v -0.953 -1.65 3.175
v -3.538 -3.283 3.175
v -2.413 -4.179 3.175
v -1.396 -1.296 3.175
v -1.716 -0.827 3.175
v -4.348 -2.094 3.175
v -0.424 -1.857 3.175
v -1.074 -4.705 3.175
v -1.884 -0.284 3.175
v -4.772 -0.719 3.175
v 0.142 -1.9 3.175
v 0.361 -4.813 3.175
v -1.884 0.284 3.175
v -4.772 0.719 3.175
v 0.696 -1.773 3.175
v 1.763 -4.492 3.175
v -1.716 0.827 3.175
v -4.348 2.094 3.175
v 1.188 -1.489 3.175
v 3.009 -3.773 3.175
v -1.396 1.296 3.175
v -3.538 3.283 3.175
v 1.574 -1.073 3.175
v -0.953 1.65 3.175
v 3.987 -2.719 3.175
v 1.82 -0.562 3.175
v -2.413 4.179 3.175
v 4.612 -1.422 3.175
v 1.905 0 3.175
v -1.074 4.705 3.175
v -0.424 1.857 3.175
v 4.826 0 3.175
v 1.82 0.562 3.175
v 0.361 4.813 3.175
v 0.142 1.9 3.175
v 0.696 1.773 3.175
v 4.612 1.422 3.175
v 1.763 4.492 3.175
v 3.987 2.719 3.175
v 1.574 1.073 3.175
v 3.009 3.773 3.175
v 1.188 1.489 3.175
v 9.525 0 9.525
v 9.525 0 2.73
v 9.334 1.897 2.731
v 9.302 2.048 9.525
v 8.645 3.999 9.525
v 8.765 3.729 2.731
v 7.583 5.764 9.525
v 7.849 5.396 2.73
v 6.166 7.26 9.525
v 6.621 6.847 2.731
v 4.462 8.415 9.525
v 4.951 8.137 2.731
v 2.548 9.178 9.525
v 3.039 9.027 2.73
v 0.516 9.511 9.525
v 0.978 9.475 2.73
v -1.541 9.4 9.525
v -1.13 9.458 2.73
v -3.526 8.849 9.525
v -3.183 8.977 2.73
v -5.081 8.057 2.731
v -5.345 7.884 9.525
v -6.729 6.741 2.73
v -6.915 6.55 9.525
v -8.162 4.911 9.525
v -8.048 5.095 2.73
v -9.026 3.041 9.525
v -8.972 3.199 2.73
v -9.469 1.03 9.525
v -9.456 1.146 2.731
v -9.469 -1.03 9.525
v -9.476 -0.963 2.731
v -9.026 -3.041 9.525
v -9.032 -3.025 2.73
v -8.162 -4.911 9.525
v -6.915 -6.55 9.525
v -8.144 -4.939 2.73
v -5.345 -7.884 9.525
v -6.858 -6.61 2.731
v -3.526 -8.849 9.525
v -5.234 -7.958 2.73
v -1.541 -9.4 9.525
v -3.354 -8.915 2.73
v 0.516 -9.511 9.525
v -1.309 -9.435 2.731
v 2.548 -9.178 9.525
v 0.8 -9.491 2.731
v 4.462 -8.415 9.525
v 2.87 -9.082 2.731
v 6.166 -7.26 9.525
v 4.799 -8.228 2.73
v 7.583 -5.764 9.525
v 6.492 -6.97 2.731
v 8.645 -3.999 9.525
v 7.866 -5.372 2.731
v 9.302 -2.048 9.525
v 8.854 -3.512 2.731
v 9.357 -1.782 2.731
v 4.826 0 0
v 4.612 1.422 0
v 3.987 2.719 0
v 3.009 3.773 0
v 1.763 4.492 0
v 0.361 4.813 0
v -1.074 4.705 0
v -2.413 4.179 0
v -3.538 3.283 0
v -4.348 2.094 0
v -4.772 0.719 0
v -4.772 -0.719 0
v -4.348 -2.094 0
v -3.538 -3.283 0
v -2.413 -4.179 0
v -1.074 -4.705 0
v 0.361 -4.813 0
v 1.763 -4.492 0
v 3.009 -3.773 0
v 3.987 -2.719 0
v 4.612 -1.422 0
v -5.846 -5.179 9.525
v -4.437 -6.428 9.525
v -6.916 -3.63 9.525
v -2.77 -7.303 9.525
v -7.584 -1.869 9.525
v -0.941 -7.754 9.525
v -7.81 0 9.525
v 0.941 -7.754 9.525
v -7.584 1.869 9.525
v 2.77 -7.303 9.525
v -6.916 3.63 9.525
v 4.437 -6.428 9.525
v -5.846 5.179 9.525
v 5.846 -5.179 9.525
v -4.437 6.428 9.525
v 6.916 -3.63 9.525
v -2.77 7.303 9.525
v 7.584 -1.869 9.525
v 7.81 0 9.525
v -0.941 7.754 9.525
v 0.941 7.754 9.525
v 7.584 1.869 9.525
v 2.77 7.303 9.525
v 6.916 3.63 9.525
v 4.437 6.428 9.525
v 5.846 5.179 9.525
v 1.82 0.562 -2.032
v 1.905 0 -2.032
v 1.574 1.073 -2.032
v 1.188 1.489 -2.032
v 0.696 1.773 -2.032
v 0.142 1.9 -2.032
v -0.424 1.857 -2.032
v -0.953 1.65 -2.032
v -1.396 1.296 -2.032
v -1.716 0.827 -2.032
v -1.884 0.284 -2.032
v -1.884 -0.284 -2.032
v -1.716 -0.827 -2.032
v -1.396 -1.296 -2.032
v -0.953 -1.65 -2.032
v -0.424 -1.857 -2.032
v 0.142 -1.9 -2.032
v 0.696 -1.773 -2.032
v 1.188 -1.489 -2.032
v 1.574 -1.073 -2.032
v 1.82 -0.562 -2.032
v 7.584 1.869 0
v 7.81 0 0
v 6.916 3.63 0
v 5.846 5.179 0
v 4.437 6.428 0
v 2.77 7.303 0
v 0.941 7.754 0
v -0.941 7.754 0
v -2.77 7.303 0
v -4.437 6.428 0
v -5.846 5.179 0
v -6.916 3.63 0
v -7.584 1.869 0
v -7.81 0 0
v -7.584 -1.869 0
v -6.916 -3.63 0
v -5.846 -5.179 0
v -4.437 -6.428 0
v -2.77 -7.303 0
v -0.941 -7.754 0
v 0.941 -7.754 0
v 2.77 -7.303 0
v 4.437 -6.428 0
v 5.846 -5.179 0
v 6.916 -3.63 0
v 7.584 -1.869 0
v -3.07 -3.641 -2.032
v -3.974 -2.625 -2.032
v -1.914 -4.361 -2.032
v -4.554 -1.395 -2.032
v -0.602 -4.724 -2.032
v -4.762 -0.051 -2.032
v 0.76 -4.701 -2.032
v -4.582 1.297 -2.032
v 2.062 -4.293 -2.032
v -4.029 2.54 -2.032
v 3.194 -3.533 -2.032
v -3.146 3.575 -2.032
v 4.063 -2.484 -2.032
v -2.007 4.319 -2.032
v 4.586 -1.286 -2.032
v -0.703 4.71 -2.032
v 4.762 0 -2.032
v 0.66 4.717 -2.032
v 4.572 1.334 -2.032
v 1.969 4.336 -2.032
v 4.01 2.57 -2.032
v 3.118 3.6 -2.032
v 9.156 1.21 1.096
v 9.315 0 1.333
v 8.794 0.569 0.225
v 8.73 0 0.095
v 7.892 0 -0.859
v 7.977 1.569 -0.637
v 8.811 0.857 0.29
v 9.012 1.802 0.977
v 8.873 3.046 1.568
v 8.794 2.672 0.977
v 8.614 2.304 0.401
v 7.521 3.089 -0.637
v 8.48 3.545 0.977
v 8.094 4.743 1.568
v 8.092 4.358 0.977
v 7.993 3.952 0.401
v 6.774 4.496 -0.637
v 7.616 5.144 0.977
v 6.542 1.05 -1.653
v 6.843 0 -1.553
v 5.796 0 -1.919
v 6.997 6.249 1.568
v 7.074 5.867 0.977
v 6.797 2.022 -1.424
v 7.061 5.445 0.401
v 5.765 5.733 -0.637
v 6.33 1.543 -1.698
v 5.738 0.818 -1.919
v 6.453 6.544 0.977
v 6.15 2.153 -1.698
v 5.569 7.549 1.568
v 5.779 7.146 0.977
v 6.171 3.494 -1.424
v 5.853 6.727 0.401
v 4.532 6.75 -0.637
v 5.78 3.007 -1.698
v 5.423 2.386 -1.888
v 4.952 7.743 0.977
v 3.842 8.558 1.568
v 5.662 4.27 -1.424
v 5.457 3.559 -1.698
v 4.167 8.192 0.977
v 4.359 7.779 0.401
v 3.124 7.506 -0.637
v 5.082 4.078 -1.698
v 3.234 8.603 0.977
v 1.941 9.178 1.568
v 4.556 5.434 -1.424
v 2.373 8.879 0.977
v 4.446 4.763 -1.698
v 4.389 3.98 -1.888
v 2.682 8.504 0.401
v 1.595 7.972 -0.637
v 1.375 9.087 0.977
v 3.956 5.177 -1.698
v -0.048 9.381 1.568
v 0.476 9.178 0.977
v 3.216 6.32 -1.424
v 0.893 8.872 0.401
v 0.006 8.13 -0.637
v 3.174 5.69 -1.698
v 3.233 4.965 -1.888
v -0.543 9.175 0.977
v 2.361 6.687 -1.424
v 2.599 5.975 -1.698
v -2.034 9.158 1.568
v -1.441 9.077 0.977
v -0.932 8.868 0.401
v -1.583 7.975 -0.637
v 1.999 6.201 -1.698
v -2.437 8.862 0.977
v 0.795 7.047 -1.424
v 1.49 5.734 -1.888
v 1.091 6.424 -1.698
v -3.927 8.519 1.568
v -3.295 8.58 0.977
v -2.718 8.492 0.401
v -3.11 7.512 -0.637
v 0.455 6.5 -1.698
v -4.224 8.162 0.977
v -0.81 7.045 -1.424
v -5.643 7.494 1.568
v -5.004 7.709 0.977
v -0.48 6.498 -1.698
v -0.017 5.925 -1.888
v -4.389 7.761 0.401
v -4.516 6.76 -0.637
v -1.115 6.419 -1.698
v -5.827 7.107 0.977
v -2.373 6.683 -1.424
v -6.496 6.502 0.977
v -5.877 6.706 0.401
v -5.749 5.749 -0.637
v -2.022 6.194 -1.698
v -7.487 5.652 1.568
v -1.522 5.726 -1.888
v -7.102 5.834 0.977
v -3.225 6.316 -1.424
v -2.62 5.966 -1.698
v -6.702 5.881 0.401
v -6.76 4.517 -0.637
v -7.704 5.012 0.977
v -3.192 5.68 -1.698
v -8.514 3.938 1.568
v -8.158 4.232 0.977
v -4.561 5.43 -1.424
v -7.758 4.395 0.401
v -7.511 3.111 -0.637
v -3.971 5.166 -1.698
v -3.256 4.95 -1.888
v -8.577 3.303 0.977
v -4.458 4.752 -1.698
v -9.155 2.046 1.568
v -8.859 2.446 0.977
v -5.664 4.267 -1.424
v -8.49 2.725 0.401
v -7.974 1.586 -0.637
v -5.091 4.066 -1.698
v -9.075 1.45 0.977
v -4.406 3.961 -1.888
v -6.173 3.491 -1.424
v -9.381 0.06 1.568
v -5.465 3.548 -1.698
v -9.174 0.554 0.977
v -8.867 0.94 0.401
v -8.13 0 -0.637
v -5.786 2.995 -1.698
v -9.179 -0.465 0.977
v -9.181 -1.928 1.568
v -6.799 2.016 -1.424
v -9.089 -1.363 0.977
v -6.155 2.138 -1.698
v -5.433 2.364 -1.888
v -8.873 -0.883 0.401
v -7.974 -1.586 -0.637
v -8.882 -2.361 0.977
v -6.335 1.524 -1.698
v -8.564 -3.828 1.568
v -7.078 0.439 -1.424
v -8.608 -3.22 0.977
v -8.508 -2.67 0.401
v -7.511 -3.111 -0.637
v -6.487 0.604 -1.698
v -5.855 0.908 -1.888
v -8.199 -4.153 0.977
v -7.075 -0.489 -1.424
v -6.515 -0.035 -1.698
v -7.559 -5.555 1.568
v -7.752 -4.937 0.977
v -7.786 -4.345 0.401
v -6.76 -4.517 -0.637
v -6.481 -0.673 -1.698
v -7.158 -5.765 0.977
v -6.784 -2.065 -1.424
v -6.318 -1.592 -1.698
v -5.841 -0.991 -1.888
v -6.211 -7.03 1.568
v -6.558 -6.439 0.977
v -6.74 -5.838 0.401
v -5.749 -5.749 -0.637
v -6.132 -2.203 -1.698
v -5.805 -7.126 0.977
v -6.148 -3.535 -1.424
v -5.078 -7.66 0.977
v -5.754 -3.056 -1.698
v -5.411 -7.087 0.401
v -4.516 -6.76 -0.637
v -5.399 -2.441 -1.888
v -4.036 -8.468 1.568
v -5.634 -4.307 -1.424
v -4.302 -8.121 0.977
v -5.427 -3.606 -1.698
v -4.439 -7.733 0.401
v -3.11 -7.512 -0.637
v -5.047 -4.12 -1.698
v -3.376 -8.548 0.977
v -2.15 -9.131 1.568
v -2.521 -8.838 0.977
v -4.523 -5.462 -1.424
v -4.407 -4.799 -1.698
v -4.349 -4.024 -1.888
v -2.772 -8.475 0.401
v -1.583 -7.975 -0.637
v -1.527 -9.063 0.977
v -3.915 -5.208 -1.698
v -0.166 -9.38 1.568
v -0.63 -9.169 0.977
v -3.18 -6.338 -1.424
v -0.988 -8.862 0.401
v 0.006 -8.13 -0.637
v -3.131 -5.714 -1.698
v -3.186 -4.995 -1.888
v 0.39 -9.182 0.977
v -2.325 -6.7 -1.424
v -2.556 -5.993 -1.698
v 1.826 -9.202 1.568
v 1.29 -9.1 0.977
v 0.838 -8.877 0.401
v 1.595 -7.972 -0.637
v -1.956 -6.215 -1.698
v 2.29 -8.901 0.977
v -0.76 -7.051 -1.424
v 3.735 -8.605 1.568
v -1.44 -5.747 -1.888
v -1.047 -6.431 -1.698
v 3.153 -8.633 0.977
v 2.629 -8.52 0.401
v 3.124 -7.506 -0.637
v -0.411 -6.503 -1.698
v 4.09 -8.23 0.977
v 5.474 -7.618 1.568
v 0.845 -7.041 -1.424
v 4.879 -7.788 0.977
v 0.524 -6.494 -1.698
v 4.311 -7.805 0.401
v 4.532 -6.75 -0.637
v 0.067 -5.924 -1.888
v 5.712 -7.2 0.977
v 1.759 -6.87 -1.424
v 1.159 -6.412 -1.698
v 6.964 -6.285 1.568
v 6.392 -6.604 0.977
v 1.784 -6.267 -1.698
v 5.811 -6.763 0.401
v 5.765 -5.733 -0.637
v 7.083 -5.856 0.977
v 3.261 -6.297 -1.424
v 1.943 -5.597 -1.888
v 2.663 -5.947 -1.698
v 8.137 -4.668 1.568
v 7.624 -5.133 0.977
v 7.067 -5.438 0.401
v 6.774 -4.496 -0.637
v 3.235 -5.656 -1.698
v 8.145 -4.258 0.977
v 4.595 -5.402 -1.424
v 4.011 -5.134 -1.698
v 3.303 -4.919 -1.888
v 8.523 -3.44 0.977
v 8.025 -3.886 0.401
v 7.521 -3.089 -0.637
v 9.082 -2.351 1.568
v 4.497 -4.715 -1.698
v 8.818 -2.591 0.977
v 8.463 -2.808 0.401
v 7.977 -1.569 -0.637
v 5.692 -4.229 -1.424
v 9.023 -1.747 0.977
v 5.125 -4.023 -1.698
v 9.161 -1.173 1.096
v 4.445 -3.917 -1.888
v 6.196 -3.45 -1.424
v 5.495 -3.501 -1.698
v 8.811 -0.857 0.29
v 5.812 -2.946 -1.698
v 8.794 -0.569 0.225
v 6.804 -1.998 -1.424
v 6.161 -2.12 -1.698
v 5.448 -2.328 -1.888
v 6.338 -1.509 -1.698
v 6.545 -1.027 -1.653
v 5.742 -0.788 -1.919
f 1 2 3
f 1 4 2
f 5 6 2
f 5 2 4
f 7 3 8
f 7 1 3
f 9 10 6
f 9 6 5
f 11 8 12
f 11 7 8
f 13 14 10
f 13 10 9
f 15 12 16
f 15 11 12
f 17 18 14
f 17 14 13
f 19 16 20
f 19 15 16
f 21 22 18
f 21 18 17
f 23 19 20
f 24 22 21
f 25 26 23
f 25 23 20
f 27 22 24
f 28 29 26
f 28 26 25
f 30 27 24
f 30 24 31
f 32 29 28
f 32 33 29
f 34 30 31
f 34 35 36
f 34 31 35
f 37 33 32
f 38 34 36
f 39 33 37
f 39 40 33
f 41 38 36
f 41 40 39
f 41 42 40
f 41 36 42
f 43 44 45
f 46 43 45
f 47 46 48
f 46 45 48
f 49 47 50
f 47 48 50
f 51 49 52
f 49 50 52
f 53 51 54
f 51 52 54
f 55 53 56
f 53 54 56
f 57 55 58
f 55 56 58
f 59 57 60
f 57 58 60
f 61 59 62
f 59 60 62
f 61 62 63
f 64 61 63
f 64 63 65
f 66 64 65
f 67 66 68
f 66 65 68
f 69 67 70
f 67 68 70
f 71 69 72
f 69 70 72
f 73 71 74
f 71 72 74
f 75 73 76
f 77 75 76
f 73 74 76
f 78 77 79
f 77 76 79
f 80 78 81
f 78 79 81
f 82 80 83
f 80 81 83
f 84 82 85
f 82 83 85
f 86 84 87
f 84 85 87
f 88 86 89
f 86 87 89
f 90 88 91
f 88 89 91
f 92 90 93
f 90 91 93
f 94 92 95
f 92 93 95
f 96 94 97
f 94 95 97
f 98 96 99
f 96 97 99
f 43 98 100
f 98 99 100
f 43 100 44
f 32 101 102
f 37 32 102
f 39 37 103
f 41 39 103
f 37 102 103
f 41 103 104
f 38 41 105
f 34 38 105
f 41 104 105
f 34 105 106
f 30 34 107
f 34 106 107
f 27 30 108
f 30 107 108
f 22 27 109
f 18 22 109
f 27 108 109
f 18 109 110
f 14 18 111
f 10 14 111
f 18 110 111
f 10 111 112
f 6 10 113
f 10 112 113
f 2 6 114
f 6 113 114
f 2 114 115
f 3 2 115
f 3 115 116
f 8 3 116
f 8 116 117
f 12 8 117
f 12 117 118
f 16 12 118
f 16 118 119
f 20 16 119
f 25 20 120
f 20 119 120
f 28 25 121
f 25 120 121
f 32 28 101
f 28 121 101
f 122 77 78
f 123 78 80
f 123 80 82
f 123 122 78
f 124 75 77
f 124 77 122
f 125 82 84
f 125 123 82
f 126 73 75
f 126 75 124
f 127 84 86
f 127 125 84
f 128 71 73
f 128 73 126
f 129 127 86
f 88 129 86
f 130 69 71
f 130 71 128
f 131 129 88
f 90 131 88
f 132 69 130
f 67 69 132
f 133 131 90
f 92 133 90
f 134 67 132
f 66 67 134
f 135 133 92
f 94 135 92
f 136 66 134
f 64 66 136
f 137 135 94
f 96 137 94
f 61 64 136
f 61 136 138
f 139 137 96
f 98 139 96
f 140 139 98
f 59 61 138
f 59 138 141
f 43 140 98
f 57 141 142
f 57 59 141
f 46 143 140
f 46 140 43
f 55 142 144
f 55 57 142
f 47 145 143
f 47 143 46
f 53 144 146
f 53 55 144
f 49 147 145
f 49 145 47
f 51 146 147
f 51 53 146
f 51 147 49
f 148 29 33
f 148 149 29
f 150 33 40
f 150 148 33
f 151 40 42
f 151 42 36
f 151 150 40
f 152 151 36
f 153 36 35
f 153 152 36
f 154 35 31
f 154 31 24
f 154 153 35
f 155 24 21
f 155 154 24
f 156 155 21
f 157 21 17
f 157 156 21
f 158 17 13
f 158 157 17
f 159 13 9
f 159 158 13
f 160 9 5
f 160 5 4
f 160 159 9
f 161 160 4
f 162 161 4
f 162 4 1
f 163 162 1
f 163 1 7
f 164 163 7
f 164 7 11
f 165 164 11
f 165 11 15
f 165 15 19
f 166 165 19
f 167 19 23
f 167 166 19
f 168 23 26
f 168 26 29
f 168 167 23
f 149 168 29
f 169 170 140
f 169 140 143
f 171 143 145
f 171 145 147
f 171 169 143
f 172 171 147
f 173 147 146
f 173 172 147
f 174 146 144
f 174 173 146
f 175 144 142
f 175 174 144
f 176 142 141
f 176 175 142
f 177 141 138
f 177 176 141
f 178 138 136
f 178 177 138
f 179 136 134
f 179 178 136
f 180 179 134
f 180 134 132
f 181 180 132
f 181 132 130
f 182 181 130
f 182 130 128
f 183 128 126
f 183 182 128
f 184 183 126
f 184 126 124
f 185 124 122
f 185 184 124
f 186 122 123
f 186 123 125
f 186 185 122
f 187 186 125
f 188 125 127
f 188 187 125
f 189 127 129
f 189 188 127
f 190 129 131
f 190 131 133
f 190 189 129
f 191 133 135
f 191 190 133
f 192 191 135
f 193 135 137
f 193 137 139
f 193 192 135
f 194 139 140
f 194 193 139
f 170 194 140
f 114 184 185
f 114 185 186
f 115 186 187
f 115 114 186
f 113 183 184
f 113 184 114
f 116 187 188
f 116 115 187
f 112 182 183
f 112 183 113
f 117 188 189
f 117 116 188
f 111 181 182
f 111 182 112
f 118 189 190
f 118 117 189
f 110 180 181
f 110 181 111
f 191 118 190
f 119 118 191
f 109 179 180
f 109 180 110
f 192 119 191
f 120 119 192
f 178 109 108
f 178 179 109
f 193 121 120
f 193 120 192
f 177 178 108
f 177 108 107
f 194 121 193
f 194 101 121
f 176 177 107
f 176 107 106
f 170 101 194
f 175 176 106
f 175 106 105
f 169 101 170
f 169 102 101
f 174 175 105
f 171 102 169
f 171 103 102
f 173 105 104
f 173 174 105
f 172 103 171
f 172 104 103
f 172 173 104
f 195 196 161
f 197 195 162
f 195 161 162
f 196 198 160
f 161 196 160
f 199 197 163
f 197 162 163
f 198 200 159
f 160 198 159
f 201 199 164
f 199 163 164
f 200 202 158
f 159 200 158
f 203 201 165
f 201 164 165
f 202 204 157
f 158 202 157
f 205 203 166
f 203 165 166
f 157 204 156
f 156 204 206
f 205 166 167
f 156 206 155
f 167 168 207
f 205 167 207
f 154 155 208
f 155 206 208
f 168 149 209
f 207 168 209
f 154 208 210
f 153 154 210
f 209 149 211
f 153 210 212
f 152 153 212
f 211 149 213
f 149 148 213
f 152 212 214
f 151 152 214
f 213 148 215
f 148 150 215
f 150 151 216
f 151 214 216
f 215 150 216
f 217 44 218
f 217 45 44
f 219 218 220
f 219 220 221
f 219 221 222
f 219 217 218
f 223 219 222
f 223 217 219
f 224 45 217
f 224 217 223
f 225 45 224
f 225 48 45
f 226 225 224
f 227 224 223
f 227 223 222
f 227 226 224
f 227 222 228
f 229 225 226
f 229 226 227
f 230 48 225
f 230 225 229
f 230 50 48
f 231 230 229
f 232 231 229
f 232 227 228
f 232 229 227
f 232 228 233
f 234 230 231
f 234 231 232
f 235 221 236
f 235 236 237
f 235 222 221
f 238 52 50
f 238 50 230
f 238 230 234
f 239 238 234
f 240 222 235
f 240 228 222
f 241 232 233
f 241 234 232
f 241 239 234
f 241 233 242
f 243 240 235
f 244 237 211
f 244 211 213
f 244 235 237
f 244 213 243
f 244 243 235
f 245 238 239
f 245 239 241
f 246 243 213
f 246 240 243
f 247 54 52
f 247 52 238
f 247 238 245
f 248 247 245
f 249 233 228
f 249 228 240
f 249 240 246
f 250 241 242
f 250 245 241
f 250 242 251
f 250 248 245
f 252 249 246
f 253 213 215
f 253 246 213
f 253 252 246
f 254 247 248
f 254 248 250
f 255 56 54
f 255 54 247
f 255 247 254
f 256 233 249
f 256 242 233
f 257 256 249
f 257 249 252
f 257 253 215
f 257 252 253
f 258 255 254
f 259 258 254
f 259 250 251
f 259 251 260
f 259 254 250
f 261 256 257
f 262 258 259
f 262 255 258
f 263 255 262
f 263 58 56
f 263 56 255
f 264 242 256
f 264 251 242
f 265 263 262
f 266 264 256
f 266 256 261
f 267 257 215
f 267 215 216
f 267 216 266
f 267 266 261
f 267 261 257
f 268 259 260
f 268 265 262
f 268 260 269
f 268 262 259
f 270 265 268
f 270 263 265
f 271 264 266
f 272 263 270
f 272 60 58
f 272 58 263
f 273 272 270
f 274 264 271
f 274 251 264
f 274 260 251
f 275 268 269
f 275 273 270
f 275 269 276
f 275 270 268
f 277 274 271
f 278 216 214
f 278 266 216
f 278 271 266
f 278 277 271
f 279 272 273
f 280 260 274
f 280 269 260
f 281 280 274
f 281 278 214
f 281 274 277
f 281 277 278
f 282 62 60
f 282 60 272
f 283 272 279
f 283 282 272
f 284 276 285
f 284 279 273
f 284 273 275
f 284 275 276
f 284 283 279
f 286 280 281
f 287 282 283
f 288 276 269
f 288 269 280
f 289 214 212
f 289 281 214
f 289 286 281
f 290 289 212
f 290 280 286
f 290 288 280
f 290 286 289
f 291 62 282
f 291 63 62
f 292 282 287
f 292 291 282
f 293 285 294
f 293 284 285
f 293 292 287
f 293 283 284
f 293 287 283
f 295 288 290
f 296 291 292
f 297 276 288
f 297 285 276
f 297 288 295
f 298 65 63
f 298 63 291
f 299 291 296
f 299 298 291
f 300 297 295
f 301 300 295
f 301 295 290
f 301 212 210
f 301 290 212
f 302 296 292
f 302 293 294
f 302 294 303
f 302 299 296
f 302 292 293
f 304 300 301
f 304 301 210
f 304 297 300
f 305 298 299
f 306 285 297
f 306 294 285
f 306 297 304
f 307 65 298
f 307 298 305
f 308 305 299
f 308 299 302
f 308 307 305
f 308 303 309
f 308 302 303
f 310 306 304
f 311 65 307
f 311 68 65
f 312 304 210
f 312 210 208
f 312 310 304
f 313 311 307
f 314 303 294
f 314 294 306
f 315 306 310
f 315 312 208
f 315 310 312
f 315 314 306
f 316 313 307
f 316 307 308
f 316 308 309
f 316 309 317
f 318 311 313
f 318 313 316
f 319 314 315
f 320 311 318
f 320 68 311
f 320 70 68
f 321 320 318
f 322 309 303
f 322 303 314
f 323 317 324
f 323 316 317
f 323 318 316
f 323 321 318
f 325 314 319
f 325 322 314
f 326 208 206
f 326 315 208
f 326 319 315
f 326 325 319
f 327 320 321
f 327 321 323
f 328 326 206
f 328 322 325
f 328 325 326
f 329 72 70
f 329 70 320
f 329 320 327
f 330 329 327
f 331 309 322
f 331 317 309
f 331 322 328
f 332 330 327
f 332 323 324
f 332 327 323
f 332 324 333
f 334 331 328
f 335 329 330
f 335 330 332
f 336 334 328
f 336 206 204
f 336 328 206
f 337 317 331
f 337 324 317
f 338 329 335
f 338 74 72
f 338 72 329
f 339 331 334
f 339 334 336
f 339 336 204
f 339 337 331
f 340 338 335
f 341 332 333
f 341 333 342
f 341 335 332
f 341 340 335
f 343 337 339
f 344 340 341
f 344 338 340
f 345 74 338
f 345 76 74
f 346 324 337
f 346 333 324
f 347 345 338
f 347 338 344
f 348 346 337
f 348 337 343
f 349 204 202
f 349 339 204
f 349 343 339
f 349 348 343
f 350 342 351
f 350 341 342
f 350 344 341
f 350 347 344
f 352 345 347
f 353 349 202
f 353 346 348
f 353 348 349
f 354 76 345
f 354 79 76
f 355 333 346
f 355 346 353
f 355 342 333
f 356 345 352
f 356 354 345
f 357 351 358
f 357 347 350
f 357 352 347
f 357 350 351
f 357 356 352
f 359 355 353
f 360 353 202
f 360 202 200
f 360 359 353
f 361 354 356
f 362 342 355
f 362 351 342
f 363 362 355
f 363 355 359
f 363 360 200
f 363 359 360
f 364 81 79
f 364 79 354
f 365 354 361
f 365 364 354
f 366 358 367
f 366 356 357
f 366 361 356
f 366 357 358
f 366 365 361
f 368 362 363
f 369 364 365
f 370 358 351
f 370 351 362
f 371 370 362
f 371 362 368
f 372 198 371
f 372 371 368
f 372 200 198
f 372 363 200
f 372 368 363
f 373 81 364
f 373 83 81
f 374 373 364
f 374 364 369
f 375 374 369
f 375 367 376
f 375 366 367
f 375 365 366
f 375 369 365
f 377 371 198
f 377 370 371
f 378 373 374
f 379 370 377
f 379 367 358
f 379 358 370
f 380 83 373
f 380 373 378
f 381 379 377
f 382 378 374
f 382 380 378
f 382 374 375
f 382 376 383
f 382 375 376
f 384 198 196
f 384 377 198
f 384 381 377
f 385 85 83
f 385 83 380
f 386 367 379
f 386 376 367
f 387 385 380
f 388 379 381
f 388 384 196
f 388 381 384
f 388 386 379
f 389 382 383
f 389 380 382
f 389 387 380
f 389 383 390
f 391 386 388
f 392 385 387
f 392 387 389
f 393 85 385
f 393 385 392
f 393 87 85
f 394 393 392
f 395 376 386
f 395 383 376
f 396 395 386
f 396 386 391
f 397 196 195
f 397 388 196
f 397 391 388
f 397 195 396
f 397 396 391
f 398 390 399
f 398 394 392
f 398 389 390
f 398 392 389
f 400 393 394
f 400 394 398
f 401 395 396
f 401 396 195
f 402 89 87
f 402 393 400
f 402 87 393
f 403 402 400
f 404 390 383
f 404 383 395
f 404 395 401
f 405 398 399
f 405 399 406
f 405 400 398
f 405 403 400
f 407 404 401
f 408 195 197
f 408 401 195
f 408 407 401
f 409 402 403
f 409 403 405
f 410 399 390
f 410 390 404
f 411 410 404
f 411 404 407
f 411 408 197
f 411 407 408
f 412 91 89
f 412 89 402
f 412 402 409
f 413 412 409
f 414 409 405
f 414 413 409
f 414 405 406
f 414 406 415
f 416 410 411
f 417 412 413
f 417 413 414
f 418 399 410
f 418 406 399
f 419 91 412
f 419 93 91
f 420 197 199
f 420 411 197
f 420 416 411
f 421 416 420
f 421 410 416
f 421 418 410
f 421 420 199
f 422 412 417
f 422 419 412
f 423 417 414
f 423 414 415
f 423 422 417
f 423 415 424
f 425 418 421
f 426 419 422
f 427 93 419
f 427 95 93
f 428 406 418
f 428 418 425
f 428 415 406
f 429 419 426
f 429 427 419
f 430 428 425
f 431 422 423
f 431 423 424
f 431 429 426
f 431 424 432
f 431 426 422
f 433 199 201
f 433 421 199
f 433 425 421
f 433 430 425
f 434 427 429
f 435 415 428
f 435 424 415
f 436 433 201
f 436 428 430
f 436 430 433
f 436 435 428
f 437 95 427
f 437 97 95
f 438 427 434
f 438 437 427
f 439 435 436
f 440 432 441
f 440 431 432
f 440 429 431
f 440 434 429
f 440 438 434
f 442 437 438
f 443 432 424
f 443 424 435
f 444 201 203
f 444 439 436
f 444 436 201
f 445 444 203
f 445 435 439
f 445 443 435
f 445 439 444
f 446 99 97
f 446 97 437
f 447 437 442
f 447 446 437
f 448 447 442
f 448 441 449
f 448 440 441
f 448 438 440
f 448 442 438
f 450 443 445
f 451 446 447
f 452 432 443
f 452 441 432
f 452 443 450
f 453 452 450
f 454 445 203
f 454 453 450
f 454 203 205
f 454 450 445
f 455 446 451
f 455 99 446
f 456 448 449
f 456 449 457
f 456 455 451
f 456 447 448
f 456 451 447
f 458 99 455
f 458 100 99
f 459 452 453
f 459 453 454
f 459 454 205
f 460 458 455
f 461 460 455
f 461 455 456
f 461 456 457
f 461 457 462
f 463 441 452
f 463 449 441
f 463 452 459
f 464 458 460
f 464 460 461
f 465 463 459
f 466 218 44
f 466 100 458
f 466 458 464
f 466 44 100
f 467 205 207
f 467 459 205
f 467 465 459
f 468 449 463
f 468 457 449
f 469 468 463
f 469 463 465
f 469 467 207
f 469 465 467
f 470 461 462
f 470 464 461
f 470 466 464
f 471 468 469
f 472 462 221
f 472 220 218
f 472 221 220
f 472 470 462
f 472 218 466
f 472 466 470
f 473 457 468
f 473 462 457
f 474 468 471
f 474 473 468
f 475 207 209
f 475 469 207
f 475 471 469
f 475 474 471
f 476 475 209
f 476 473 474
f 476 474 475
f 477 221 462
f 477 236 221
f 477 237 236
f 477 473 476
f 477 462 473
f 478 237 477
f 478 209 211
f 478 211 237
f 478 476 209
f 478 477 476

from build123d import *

# Parameters (mm, degrees)
F0_R     = 9.525
F0_R_2   = 7.8105
F0_R_3   = 6.096
F0_R_4   = 4.826
F0_R_5   = 1.905
F1_DEPTH = 2.032
F2_DEPTH = 9.525
F3_R     = 4.7625
F4_DEPTH = 3.175


with BuildPart() as f1:
    # F0 (on Top) → F1 (new body)
    with BuildSketch(Plane.XY):
        Circle(F0_R)
        Circle(F0_R_2, mode=Mode.SUBTRACT)
        Circle(F0_R_2)
        Circle(F0_R_3, mode=Mode.SUBTRACT)
        Circle(F0_R_3)
        Circle(F0_R_4, mode=Mode.SUBTRACT)
        Circle(F0_R_4)
        Circle(F0_R_5, mode=Mode.SUBTRACT)
    extrude(amount=-F1_DEPTH)

    # F0 (on Top) → F2 (join)
    with BuildSketch(Plane.XY):
        Circle(F0_R)
        Circle(F0_R_2, mode=Mode.SUBTRACT)
    extrude(amount=F2_DEPTH)

    # F3
    f3_edges = [f1.edges().sort_by_distance(p)[0] for p in [
        (-9.525, 0, -2.032),
    ]]
    fillet(f3_edges, radius=F3_R)

    # F0 (on Top) → F4 (join)
    with BuildSketch(Plane.XY):
        Circle(F0_R_4)
        Circle(F0_R_5, mode=Mode.SUBTRACT)
    extrude(amount=F4_DEPTH)


solid = f1.part
